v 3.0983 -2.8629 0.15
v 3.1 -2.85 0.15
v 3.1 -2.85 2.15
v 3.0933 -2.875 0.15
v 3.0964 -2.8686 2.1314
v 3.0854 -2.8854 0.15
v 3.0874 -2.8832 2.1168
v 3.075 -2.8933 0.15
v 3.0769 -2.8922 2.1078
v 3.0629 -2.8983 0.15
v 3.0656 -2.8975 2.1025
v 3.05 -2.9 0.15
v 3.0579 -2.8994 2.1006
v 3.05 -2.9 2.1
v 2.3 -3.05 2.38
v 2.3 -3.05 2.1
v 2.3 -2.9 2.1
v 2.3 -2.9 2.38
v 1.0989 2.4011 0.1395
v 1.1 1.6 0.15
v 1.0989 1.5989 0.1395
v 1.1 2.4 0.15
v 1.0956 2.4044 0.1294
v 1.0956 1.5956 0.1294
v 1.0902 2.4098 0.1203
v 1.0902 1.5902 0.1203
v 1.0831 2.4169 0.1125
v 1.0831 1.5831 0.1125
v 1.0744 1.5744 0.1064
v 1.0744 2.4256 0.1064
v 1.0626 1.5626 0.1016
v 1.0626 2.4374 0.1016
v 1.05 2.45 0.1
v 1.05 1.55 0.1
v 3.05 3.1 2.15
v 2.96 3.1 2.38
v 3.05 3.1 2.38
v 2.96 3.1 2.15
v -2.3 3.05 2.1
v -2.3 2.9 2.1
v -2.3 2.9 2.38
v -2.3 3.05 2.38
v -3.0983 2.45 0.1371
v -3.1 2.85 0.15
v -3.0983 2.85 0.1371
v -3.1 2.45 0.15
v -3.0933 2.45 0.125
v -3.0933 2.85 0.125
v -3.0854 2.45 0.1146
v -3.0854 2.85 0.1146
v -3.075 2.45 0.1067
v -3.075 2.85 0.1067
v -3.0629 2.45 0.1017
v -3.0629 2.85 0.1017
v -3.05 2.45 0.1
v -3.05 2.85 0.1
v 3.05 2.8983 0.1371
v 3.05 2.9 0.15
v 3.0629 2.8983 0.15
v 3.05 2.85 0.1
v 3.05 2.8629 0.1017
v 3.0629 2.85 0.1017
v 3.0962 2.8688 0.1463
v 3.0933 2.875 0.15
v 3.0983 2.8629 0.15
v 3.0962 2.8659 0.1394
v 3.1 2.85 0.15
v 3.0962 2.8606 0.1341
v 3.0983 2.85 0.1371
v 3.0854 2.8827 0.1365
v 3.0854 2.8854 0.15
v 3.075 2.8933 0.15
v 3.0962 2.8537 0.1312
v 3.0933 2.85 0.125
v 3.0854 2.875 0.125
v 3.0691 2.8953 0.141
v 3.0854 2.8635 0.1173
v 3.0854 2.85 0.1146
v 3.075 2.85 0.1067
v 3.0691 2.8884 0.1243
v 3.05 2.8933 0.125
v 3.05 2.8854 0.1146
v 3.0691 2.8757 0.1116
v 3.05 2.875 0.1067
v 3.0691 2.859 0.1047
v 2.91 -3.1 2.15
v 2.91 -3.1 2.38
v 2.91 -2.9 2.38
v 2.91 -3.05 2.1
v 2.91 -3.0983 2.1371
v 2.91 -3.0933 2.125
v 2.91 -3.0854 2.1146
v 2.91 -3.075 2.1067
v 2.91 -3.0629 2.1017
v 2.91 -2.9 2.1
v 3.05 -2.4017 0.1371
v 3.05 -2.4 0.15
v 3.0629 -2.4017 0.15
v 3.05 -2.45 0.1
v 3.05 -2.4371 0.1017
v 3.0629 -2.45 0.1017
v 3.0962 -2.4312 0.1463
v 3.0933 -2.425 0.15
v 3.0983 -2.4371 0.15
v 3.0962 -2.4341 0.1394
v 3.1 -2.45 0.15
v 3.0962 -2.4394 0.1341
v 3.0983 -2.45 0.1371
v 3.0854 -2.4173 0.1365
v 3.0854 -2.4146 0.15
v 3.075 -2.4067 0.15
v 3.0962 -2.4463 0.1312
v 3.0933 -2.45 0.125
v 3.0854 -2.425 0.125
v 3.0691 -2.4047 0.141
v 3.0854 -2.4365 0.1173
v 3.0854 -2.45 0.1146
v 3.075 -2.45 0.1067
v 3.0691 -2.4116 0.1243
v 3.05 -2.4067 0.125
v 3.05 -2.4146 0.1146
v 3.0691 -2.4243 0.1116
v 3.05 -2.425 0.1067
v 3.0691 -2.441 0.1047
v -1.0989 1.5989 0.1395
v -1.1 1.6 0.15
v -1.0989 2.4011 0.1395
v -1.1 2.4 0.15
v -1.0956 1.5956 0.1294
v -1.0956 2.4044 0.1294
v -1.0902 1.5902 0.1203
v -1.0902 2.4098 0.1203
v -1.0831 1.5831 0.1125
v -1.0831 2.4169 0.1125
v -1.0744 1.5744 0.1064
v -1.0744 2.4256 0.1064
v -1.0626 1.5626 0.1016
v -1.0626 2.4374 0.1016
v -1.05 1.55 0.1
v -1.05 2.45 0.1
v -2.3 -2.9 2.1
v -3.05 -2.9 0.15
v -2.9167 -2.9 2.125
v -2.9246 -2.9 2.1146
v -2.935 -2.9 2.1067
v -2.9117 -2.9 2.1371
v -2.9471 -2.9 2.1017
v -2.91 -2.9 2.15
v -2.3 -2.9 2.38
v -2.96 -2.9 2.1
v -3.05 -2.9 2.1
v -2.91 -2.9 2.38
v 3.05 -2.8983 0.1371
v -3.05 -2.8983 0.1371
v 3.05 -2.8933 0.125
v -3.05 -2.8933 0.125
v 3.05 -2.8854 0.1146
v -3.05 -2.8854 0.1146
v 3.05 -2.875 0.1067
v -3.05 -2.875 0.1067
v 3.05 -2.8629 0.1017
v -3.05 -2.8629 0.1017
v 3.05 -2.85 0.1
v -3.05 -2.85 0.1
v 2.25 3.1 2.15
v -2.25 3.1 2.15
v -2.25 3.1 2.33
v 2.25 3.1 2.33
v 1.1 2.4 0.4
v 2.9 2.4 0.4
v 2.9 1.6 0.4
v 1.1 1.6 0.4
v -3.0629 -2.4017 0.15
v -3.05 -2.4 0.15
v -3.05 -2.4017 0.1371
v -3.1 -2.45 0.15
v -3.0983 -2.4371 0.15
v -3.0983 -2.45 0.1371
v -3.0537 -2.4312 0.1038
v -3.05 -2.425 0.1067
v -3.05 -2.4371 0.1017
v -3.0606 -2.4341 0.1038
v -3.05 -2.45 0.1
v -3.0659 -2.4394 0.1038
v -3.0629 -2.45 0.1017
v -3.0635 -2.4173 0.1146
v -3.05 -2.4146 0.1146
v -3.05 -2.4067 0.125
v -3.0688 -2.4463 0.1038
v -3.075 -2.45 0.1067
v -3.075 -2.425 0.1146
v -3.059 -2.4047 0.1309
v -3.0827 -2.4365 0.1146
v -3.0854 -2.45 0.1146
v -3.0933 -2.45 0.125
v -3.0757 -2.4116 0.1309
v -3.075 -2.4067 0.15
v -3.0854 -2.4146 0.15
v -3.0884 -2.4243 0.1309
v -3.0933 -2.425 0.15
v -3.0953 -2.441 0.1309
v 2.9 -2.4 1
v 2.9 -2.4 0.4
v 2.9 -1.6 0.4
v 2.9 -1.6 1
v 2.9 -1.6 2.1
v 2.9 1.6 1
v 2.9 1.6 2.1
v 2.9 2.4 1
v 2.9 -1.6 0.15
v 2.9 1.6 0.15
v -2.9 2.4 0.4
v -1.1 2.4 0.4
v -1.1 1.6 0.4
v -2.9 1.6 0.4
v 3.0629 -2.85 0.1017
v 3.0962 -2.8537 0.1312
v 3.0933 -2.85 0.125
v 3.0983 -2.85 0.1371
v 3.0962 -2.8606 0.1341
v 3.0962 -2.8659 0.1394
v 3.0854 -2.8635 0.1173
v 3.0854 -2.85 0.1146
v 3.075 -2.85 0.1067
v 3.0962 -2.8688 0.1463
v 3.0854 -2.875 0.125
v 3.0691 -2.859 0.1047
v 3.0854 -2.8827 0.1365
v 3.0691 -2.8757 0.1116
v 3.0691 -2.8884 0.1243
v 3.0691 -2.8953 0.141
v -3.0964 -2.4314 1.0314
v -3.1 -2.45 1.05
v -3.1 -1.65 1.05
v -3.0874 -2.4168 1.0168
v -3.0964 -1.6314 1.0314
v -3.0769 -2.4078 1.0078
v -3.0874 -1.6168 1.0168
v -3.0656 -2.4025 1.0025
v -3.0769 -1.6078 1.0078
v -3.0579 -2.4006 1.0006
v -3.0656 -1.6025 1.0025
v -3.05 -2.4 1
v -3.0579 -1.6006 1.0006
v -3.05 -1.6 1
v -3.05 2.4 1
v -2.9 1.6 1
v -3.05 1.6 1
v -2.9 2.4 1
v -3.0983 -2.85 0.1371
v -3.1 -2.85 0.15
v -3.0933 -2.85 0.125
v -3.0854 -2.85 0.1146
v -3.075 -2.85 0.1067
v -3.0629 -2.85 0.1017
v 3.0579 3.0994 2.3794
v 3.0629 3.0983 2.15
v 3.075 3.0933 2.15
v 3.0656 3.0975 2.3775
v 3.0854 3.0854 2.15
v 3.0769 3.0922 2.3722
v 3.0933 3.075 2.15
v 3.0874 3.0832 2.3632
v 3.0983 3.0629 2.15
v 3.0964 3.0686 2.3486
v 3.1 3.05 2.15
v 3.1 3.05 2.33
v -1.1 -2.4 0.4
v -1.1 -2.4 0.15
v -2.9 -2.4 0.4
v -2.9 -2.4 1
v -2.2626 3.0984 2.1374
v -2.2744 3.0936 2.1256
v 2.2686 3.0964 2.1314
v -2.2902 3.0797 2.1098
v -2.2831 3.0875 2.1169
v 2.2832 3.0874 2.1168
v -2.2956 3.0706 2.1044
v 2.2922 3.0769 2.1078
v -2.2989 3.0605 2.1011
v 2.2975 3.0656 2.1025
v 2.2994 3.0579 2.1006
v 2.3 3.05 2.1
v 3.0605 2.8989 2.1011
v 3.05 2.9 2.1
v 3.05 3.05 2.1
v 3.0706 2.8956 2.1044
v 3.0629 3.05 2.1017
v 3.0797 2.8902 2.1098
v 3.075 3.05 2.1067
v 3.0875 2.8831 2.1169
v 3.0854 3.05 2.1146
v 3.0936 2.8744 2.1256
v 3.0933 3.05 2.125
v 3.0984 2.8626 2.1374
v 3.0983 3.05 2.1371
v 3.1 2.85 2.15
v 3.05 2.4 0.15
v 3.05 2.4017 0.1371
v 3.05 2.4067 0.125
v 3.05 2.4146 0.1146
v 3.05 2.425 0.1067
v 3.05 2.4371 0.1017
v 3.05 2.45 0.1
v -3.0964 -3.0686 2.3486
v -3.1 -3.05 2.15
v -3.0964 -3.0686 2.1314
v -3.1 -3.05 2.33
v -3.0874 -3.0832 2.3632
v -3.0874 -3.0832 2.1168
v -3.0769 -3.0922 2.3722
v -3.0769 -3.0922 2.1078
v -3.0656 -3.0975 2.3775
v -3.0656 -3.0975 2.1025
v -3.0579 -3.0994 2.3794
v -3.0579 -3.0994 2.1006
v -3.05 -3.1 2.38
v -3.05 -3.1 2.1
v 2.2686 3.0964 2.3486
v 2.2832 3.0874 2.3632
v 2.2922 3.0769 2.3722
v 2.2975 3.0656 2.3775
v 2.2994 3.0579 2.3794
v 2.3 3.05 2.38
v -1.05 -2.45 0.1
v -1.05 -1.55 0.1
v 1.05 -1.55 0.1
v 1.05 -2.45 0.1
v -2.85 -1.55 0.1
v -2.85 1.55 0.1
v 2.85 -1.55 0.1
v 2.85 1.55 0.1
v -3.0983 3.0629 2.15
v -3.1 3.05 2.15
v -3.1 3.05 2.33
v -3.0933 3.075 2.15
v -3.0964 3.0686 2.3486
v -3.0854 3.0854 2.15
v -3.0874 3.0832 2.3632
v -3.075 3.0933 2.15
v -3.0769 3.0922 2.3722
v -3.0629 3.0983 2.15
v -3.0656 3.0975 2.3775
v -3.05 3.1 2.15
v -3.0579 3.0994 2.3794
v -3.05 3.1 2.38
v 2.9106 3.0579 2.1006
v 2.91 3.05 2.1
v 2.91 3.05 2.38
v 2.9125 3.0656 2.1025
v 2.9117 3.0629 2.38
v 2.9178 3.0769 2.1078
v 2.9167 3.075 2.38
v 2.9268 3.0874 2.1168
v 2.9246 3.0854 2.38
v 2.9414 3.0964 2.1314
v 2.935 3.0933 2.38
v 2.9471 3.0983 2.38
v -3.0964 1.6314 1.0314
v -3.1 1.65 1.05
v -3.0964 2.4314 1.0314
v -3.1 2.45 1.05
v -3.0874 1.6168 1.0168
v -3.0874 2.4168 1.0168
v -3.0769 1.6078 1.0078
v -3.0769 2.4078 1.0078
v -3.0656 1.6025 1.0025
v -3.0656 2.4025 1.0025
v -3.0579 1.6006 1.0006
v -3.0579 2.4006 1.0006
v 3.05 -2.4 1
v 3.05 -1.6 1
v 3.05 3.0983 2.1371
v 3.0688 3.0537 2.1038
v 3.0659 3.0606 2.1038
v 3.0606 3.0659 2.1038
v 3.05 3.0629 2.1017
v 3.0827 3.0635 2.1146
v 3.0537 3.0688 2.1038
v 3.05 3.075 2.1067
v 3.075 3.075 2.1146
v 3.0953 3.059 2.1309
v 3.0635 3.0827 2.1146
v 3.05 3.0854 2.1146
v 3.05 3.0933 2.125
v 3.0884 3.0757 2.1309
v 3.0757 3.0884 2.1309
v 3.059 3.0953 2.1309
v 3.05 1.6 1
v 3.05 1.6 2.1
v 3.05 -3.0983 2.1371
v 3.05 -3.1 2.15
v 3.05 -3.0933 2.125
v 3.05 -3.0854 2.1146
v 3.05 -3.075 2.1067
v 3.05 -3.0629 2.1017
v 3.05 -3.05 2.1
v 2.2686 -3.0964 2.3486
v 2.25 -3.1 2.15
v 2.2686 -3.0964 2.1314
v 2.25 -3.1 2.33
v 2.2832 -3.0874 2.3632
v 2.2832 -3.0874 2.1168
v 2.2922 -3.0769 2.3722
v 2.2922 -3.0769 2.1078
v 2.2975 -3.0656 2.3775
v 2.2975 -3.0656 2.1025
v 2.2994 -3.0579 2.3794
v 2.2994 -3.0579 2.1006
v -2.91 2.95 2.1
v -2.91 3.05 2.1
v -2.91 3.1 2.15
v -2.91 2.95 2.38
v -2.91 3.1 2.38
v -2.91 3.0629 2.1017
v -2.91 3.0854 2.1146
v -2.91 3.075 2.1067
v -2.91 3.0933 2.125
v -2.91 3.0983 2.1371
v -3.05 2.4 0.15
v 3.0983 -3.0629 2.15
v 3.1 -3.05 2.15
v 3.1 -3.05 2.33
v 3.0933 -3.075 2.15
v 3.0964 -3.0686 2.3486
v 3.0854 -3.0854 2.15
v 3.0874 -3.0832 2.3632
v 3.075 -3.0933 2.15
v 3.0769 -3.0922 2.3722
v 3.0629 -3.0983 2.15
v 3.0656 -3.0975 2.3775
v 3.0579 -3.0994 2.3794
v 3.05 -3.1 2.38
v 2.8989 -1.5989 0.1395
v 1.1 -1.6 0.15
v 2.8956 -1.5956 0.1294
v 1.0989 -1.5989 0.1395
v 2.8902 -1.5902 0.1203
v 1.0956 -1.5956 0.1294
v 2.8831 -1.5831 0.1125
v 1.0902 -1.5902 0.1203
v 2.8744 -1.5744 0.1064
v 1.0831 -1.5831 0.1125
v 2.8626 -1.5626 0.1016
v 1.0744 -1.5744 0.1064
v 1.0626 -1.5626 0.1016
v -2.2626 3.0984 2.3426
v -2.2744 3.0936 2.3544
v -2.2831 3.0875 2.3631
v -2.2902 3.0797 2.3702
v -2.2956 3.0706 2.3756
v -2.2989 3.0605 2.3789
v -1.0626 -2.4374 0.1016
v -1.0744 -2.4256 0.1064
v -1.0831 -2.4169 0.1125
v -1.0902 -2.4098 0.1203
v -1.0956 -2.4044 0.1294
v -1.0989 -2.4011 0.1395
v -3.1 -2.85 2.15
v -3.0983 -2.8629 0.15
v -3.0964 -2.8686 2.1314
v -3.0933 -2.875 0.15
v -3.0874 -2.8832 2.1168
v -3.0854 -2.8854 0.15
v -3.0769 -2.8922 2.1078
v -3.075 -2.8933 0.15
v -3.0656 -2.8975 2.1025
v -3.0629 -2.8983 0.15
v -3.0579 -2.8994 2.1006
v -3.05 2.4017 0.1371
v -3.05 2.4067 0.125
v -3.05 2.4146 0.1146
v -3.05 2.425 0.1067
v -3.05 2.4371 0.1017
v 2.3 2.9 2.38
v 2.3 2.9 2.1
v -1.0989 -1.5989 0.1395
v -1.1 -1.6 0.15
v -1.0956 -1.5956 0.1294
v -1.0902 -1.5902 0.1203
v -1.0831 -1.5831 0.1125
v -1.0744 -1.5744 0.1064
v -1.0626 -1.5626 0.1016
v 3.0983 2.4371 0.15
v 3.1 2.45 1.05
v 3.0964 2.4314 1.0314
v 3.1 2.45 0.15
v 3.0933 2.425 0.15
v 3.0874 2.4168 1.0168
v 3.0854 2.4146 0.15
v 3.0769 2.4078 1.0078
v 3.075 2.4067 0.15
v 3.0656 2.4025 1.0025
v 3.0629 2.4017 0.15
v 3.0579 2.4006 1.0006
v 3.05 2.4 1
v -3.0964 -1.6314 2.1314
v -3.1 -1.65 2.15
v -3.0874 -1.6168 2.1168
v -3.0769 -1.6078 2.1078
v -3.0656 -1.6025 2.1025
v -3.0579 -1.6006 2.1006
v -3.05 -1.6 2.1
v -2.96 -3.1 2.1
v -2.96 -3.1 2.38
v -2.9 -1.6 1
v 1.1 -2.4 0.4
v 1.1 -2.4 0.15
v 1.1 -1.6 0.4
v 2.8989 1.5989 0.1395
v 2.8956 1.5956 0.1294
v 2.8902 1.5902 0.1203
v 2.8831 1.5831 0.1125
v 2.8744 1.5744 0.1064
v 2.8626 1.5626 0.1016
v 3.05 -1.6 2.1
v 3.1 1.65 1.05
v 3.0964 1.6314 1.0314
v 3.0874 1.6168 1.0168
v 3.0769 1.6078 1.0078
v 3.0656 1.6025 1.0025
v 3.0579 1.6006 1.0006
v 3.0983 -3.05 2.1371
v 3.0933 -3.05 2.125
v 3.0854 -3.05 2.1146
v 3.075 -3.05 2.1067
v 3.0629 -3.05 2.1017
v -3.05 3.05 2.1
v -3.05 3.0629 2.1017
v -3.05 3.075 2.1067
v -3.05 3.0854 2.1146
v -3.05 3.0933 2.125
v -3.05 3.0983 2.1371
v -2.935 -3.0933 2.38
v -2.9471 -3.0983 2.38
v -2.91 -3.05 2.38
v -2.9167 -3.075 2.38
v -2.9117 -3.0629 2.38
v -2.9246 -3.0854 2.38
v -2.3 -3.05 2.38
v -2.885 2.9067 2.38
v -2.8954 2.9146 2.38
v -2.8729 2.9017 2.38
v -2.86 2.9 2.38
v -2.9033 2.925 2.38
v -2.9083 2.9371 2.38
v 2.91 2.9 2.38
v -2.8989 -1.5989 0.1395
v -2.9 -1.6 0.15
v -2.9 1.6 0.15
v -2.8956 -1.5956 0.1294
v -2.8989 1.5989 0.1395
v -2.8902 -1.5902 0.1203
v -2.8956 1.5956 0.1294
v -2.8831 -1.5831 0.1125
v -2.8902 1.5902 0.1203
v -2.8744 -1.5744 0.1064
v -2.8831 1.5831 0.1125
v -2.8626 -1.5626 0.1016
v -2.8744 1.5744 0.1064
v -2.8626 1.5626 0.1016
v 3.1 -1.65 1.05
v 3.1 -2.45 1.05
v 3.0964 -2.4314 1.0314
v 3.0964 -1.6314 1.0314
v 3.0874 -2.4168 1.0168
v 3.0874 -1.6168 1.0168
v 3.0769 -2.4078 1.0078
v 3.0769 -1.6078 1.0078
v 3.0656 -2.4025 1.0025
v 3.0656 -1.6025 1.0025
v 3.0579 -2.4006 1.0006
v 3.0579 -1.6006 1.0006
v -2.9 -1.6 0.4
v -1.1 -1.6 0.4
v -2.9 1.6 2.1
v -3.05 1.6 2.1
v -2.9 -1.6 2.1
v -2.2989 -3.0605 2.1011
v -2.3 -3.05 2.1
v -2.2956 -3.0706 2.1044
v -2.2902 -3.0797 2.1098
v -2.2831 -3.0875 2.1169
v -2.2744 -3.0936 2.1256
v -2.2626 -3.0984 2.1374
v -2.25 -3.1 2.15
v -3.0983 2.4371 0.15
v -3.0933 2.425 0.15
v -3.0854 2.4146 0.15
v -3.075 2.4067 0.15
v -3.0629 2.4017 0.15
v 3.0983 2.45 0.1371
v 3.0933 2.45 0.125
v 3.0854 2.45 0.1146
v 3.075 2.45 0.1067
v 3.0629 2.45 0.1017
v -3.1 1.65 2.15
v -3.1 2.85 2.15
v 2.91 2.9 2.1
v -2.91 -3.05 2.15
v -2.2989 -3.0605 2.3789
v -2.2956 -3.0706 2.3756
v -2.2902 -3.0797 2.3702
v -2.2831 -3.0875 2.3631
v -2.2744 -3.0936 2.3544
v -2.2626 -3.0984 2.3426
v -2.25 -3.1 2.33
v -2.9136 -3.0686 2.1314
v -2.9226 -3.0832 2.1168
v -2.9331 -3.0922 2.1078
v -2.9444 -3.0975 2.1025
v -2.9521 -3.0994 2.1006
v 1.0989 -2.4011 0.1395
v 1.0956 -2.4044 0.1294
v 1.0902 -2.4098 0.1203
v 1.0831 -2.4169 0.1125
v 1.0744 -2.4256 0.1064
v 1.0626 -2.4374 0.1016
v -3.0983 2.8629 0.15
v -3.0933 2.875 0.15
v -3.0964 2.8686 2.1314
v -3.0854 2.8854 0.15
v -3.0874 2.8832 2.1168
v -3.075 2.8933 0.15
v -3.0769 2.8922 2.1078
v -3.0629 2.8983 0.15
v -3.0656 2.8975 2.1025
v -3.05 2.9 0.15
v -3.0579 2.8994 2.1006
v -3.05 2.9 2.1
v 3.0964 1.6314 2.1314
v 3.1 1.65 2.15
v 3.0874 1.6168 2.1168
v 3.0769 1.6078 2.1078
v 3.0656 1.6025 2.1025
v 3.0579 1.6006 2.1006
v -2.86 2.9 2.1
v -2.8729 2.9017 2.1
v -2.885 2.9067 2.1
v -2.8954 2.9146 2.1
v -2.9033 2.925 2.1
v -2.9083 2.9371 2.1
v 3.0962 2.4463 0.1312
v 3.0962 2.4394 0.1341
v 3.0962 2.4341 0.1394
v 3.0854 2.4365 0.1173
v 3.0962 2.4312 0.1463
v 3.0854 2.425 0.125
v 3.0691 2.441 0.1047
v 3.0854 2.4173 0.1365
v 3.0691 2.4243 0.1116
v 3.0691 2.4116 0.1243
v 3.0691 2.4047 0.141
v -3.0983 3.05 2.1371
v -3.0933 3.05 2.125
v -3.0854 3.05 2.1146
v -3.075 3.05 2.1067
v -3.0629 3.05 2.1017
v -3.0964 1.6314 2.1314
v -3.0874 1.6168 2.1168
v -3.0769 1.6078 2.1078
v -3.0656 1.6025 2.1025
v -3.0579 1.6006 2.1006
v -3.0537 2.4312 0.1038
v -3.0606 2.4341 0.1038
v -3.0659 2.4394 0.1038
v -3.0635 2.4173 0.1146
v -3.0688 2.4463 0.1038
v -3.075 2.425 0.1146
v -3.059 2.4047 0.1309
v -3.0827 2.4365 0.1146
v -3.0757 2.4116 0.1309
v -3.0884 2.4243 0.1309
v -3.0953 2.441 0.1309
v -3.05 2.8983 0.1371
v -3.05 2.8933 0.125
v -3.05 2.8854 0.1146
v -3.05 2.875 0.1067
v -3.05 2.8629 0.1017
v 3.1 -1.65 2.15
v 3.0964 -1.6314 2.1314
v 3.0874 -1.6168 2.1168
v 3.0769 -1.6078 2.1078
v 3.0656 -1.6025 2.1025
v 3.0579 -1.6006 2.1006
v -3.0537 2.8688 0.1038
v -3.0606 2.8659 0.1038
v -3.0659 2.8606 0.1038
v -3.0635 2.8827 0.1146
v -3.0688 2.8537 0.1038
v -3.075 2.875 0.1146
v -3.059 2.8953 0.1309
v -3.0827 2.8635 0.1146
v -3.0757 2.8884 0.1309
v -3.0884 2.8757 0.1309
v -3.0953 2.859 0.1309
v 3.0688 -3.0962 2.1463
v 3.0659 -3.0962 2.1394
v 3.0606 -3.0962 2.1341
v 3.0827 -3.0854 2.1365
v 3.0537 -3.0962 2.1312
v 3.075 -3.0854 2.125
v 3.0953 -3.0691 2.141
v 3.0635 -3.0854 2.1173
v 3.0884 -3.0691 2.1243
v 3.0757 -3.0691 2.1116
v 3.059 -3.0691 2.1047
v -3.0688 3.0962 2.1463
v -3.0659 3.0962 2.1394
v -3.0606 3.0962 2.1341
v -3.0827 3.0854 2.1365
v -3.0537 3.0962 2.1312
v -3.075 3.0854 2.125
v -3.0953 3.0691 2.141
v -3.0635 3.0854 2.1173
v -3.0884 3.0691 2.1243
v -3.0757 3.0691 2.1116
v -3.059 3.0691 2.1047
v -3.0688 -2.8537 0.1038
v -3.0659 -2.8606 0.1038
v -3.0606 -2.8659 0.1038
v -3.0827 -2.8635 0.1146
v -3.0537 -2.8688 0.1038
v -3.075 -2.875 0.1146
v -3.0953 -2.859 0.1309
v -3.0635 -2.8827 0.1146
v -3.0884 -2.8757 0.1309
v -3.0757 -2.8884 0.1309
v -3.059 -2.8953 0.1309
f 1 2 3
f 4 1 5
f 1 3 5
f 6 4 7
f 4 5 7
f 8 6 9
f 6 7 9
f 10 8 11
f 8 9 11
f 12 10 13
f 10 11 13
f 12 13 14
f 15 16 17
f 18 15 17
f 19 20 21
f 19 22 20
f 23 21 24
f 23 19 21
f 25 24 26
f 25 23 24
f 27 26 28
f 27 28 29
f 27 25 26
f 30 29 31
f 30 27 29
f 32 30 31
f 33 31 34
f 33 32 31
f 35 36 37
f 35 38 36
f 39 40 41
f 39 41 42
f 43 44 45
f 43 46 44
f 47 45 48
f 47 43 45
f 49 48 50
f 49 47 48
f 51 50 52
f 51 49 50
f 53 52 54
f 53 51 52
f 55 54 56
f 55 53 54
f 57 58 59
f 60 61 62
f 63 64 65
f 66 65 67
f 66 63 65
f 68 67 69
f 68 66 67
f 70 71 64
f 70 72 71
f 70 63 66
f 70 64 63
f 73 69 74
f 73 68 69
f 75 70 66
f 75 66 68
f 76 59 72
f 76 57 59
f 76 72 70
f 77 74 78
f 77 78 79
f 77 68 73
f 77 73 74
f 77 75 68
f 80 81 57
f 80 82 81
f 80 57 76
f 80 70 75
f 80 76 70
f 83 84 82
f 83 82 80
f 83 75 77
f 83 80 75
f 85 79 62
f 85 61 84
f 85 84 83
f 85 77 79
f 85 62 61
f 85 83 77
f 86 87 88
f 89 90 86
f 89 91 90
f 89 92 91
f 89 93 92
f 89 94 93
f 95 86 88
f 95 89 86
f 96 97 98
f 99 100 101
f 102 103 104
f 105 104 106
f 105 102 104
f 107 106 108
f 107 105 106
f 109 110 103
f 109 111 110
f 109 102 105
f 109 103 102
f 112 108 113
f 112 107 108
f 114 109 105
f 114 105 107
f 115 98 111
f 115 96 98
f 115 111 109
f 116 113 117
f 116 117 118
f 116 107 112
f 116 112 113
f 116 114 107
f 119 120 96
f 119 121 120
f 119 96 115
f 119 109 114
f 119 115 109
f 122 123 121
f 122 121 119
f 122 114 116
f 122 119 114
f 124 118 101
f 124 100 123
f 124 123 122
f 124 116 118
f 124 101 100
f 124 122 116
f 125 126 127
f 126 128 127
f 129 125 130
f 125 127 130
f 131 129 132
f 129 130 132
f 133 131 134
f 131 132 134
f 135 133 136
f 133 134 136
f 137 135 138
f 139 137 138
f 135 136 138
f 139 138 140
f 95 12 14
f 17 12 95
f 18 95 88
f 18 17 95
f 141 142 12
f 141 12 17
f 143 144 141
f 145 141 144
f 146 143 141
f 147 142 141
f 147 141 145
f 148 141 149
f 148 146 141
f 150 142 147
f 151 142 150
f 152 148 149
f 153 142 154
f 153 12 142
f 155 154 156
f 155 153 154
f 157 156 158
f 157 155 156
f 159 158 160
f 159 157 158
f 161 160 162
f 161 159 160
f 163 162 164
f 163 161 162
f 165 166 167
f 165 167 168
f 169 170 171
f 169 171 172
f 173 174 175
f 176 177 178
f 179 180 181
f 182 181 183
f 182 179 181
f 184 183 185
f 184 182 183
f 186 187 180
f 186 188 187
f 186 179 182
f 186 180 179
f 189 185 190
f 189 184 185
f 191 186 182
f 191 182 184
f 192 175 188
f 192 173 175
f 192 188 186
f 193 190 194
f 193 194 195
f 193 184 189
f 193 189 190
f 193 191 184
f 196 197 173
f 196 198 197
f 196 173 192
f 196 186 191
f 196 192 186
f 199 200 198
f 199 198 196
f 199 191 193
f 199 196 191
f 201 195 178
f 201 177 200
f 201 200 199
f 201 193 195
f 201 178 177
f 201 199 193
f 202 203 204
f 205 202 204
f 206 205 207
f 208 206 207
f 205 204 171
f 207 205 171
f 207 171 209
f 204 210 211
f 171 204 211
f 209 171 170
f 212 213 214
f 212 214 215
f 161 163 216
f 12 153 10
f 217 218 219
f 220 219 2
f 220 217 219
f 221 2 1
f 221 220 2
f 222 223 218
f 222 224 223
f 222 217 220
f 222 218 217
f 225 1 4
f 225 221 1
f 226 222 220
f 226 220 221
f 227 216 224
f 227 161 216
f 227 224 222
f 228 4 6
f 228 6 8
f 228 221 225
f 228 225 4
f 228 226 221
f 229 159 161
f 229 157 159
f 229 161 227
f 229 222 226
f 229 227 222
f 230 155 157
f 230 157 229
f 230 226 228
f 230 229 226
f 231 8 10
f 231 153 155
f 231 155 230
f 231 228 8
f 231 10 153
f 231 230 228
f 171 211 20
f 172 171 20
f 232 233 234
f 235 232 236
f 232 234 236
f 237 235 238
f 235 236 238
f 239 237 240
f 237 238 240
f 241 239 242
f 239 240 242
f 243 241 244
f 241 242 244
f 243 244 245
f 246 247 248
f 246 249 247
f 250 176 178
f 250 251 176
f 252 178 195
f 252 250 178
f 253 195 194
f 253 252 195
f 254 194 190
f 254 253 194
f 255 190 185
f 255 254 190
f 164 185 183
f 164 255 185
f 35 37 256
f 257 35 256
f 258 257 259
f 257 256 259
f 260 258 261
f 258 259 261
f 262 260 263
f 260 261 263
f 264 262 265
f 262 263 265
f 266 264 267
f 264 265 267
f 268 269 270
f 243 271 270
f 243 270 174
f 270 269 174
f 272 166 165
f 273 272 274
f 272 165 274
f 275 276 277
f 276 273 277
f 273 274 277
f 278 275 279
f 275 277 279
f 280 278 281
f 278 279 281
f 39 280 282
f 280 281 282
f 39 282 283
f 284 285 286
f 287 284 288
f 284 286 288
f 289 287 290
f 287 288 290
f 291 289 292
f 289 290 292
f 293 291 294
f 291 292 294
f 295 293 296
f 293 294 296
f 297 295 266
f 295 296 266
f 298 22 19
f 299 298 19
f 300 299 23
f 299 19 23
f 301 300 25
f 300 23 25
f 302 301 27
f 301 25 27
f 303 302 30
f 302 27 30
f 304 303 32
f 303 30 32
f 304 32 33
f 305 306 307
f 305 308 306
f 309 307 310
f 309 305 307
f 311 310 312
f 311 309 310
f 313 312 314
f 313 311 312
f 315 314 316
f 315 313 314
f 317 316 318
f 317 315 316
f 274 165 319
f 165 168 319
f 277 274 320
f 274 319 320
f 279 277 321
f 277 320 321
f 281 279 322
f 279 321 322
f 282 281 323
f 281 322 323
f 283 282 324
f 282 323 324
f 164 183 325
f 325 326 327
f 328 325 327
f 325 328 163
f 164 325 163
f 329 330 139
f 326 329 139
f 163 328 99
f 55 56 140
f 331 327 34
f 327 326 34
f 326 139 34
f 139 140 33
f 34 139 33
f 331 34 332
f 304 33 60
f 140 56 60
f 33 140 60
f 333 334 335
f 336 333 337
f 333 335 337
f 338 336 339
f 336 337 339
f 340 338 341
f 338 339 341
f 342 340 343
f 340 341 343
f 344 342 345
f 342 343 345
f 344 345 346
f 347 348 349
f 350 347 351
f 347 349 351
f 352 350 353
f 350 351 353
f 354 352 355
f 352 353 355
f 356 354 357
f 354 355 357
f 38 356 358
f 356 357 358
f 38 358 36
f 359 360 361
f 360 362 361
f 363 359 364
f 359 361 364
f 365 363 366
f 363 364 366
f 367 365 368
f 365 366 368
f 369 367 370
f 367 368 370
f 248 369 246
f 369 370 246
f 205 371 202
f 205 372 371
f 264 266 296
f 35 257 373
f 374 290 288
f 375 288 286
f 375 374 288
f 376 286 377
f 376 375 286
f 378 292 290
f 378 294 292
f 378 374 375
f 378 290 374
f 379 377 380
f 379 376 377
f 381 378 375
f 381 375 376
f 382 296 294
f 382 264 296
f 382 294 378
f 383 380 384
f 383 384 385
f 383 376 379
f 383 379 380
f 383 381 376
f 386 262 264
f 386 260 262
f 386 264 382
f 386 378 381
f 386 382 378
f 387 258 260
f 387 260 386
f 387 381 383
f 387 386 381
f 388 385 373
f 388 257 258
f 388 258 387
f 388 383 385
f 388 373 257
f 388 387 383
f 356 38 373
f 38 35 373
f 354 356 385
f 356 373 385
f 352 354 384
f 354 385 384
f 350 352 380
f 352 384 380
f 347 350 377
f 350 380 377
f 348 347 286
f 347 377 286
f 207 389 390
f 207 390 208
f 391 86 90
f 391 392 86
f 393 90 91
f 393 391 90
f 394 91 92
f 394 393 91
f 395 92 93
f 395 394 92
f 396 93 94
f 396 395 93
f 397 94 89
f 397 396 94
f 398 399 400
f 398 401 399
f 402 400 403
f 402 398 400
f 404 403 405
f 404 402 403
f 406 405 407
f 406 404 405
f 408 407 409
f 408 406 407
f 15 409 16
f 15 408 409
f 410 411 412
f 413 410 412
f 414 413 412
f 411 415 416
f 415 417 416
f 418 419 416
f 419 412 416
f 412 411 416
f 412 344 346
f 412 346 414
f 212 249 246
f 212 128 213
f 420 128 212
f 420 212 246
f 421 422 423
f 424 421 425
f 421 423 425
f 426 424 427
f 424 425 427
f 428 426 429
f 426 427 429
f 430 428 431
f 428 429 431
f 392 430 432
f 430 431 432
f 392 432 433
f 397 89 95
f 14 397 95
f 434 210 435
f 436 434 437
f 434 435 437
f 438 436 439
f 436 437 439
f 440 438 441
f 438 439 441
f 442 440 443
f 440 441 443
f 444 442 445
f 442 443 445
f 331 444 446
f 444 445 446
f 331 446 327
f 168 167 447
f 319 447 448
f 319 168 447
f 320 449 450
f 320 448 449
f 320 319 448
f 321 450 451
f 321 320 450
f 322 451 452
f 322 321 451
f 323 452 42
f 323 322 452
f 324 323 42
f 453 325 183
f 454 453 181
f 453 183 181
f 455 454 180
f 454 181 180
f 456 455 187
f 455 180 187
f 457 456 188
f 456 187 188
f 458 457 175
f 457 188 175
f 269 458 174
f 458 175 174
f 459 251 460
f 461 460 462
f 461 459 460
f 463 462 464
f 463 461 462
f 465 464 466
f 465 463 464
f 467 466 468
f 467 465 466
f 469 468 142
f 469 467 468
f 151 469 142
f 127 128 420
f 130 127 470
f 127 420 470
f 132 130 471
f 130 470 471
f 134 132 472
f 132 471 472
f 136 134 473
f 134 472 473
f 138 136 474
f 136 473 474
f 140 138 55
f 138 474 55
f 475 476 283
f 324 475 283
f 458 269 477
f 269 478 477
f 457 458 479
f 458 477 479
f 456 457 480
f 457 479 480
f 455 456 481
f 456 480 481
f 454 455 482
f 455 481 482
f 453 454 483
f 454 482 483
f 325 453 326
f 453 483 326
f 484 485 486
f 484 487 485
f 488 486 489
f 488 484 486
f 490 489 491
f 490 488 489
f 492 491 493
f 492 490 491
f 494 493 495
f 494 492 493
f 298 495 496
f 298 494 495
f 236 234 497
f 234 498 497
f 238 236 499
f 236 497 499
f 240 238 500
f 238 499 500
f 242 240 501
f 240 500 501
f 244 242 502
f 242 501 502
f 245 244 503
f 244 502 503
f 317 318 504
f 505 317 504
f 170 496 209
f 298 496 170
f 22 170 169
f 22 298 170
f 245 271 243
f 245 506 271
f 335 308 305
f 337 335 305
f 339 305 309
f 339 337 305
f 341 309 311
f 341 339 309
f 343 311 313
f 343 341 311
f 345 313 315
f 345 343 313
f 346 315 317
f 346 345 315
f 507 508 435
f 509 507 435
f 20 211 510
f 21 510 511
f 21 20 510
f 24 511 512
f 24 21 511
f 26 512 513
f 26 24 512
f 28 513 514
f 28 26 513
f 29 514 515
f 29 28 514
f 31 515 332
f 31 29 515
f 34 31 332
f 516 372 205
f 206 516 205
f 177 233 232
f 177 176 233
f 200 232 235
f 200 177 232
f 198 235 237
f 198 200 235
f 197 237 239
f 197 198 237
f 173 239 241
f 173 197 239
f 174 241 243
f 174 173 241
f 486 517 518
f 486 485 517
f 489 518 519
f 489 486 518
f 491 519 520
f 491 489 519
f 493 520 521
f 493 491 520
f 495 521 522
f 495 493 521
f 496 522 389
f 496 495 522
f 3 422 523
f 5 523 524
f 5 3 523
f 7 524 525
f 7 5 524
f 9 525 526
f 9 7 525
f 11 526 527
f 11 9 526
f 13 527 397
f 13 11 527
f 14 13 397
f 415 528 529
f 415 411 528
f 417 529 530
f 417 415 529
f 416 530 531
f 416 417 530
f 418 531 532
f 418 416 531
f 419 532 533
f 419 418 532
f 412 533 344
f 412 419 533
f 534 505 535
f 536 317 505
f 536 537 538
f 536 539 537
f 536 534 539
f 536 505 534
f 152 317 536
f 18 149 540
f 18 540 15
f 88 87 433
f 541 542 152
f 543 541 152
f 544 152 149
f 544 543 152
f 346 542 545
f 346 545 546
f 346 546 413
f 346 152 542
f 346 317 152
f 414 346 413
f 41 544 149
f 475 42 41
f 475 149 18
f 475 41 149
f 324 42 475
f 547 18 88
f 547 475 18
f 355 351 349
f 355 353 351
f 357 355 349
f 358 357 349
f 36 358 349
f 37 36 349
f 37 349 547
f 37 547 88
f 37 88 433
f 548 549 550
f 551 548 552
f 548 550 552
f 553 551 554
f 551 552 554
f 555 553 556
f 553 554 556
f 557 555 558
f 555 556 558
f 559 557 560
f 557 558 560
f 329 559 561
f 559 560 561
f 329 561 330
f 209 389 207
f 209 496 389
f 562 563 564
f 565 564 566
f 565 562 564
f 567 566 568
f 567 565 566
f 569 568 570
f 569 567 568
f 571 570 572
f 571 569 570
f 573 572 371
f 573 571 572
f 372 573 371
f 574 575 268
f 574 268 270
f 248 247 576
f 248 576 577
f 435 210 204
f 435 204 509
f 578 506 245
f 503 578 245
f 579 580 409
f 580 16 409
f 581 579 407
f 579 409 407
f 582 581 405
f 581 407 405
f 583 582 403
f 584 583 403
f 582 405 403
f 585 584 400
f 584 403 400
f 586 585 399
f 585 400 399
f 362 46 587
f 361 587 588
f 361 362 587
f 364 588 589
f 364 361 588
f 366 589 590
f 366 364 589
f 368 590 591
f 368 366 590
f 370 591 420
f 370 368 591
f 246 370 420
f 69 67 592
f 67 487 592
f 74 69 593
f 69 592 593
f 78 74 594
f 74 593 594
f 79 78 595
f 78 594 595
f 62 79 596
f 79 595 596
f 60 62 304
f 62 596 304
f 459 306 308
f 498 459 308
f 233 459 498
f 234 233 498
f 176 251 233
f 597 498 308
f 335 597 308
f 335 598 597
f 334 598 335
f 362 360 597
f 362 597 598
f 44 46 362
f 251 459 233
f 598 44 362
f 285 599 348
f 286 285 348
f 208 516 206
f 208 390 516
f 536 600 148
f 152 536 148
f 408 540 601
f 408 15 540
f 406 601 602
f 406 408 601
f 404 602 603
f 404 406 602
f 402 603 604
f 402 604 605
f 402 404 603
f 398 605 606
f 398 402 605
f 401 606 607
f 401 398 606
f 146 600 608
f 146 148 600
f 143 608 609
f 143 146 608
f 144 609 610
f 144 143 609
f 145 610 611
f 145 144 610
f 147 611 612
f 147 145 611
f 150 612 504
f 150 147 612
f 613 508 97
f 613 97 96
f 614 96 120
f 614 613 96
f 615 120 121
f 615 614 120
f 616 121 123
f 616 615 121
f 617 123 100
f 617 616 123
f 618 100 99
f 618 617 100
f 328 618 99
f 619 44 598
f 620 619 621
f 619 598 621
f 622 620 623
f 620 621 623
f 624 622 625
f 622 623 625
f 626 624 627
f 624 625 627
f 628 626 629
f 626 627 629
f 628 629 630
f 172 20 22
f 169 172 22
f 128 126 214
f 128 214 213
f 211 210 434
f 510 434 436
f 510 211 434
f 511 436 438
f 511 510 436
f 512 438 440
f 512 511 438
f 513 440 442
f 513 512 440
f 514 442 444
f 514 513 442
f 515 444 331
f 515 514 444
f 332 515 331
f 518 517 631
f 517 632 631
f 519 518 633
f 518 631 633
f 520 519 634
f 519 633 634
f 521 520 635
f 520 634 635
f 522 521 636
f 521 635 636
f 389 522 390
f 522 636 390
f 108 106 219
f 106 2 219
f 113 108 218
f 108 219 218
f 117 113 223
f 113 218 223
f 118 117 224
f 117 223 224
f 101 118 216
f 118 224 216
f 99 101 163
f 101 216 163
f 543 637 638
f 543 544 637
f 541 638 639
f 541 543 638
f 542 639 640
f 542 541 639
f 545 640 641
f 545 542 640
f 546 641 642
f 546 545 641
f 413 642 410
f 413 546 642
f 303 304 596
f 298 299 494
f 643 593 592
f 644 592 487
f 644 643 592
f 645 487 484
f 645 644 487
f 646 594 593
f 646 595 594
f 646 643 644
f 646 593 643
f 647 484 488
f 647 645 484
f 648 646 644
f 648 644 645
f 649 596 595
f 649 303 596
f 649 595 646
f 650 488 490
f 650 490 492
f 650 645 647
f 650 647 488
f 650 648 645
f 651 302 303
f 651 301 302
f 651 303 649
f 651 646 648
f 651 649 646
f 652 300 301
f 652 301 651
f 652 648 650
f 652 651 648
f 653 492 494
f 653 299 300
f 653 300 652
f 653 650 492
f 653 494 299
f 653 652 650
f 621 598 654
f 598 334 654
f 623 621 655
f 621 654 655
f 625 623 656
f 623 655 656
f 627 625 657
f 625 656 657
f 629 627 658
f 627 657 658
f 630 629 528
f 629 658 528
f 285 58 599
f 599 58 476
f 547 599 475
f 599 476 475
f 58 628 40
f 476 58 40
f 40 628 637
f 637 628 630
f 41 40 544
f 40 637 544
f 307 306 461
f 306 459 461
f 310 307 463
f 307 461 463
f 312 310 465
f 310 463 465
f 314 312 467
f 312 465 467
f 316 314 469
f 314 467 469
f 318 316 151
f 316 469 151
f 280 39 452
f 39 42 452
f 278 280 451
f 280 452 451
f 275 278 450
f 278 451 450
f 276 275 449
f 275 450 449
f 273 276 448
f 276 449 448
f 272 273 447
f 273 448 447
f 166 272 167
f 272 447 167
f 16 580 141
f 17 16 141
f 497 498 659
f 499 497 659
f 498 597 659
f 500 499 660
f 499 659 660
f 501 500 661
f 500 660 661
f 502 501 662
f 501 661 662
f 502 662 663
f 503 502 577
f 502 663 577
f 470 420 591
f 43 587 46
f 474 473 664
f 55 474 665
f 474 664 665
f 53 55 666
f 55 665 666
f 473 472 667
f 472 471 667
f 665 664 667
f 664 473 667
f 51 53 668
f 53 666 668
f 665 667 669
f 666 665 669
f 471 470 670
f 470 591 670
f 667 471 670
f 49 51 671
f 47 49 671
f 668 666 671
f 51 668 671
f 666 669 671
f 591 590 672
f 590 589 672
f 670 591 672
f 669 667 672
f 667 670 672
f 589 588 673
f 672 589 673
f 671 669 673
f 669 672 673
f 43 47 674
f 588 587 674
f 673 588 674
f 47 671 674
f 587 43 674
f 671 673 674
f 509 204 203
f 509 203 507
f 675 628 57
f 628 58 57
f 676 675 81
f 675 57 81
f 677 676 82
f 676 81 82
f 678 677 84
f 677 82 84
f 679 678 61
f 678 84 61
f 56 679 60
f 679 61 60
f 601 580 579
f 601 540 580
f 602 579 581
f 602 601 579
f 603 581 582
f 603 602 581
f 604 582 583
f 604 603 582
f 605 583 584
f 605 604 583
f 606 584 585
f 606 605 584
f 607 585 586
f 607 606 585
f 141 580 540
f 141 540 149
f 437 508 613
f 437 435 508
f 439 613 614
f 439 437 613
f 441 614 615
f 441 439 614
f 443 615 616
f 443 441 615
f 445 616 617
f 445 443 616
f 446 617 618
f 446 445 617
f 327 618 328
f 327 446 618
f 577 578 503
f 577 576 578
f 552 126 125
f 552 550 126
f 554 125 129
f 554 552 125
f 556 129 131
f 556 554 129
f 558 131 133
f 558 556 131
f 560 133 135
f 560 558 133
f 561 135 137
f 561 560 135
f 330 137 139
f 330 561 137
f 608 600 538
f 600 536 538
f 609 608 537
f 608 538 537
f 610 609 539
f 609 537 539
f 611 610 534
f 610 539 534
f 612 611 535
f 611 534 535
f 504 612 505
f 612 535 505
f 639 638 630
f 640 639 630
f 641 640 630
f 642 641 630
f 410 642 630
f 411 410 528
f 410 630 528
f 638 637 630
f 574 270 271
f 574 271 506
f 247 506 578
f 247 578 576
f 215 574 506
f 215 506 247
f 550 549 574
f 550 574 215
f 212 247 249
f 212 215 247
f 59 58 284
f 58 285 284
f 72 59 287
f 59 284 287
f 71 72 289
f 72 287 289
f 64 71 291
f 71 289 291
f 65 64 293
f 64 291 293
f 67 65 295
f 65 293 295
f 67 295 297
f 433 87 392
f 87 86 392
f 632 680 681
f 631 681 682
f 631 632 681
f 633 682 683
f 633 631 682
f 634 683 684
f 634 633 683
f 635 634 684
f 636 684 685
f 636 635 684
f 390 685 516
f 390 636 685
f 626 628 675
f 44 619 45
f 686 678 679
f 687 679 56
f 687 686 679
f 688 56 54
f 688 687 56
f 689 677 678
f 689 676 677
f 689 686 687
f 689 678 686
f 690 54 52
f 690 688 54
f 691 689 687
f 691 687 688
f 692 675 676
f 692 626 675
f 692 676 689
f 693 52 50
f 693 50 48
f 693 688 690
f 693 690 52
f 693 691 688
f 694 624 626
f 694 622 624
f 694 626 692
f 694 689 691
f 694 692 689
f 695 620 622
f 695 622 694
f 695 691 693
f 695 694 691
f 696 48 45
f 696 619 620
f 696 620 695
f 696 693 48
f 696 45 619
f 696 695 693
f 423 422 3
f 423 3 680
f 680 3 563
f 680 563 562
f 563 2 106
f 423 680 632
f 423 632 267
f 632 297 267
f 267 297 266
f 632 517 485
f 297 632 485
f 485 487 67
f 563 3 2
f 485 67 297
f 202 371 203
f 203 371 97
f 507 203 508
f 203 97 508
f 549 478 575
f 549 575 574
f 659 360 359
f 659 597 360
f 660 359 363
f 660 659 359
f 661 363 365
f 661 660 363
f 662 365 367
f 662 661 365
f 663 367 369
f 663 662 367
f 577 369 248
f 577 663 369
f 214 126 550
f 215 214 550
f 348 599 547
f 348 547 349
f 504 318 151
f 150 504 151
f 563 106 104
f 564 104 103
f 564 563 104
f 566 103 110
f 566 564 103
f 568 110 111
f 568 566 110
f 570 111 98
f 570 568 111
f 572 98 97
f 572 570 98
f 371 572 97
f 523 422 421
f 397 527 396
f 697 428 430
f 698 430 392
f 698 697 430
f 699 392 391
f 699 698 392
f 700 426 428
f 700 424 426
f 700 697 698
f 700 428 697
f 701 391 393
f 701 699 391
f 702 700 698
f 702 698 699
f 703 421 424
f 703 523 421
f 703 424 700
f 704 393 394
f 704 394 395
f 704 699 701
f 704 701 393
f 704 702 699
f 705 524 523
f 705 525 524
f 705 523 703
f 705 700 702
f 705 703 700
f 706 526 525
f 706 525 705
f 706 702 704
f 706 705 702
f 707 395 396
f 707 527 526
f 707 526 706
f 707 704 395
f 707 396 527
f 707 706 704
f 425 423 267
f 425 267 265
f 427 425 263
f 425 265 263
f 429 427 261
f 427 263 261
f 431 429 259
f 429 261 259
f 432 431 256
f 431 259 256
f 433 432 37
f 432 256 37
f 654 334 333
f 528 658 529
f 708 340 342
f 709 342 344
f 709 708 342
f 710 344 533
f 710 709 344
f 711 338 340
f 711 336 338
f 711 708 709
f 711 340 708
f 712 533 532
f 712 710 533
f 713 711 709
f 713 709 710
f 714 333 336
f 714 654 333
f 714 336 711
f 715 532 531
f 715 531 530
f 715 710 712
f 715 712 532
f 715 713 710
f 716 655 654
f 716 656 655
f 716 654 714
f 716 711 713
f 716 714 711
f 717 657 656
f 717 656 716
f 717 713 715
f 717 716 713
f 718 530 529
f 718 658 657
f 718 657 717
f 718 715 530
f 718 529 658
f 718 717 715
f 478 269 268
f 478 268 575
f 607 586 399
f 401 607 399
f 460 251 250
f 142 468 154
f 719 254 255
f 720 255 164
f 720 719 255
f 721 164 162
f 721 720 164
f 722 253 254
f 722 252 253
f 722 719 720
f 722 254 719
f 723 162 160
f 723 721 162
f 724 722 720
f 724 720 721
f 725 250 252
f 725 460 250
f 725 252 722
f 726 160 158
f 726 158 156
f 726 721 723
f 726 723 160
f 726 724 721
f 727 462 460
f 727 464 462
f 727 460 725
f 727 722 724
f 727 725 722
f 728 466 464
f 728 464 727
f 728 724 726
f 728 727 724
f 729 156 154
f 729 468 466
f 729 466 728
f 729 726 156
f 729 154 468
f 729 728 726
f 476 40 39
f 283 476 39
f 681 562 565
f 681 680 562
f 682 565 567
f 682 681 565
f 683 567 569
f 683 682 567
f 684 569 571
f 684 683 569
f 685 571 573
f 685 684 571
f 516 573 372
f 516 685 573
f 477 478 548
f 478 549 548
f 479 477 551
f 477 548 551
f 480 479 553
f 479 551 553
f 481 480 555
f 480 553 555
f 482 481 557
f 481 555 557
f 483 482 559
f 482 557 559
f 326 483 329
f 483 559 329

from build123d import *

# Parameters (mm, degrees)
SKETCH1_W           = 6.2
SKETCH1_H           = 6.2
BOSS_EXTRUDE1_DEPTH = 2.38
SKETCH2_W           = 2
SKETCH2_H           = 0.8
CUT_EXTRUDE1_DEPTH  = 0.4
SKETCH3_W           = 6.2
SKETCH3_H           = 0.1
CUT_EXTRUDE2_DEPTH  = 7.2
SKETCH14_W          = 0.2
SKETCH14_H          = 3.2
CUT_EXTRUDE3_DEPTH  = 2
SKETCH16_W          = 2
SKETCH16_H          = 0.2
CUT_EXTRUDE4_DEPTH  = 7.2
SKETCH19_W          = 0.61
SKETCH19_H          = 0.2
CUT_EXTRUDE5_DEPTH  = 1.28
SKETCH20_W          = 0.2
SKETCH20_H          = 0.8
CUT_EXTRUDE6_DEPTH  = 0.6
FILLET1_R           = 0.05


with BuildPart() as part:
    # Sketch1 → Boss-Extrude1 (new body)
    with BuildSketch(Plane.XY):
        Rectangle(SKETCH1_W, SKETCH1_H)
    extrude(amount=BOSS_EXTRUDE1_DEPTH)

    # Sketch2 → Cut-Extrude1 (cut)
    with BuildSketch(Plane(origin=(0, 0, 0), x_dir=(-1, 0, 0), z_dir=(0, 0, -1))):
        with Locations((-2.1, 2)):
            Rectangle(SKETCH2_W, SKETCH2_H)
        with Locations((2.1, 2)):
            Rectangle(SKETCH2_W, SKETCH2_H)
        with Locations((2.1, -2)):
            Rectangle(SKETCH2_W, SKETCH2_H)
        with Locations((-2.1, -2)):
            Rectangle(SKETCH2_W, SKETCH2_H)
    extrude(amount=-CUT_EXTRUDE1_DEPTH, mode=Mode.SUBTRACT)

    # Sketch3 → Cut-Extrude2 (cut, through all)
    with BuildSketch(Plane(origin=(0, 3.1, 0), x_dir=(1, 0, 0), z_dir=(0, 1, 0))):
        with Locations((0, -0.05)):
            Rectangle(SKETCH3_W, SKETCH3_H)
    extrude(amount=-CUT_EXTRUDE2_DEPTH, mode=Mode.SUBTRACT)

    # Sketch14 → Cut-Extrude3 (cut)
    with BuildSketch(Plane(origin=(0, 0, 0.1), x_dir=(-1, 0, 0), z_dir=(0, 0, -1))):
        with Locations((3, 0)):
            Rectangle(SKETCH14_W, SKETCH14_H)
        with Locations((-3, 0)):
            Rectangle(SKETCH14_W, SKETCH14_H)
    extrude(amount=-CUT_EXTRUDE3_DEPTH, mode=Mode.SUBTRACT)

    # Sketch16 → Cut-Extrude4 (cut, through all)
    with BuildSketch(Plane.ZY.offset(3.1)):
        with Locations((1.1, -3)):
            Rectangle(SKETCH16_W, SKETCH16_H)
        with Locations((1.1, 3)):
            Rectangle(SKETCH16_W, SKETCH16_H)
    extrude(amount=-CUT_EXTRUDE4_DEPTH, mode=Mode.SUBTRACT)

    # Sketch19 → Cut-Extrude5 (cut, through all)
    with BuildSketch(Plane(origin=(0, 0, 2.1), x_dir=(-1, 0, 0), z_dir=(0, 0, -1))):
        with Locations((-2.605, -3)):
            Rectangle(SKETCH19_W, SKETCH19_H)
        with Locations((2.605, -3)):
            Rectangle(SKETCH19_W, SKETCH19_H)
        with Locations((2.605, 3)):
            Rectangle(SKETCH19_W, SKETCH19_H)
        with Locations((-2.605, 3)):
            Rectangle(SKETCH19_W, SKETCH19_H)
    extrude(amount=-CUT_EXTRUDE5_DEPTH, mode=Mode.SUBTRACT)

    # Sketch20 → Cut-Extrude6 (cut)
    with BuildSketch(Plane(origin=(0, 0, 0.4), x_dir=(-1, 0, 0), z_dir=(0, 0, -1))):
        with Locations((-3, -2)):
            Rectangle(SKETCH20_W, SKETCH20_H)
        with Locations((-3, 2)):
            Rectangle(SKETCH20_W, SKETCH20_H)
        with Locations((3, 2)):
            Rectangle(SKETCH20_W, SKETCH20_H)
        with Locations((3, -2)):
            Rectangle(SKETCH20_W, SKETCH20_H)
    extrude(amount=-CUT_EXTRUDE6_DEPTH, mode=Mode.SUBTRACT)

    # Fillet1
    fillet1_edges = [part.edges().sort_by_distance(p)[0] for p in [
        (2.3, -3.1, 2.24),
        (0, -3.1, 2.1),
        (-2.3, -3.1, 2.24),
        (0, -3.1, 2.38),
        (-2.3, 3.1, 2.24),
        (0, 3.1, 2.1),
        (2.3, 3.1, 2.24),
        (0, 3.1, 2.38),
        (-3.1, -1.6, 1.55),
        (-3.1, 0, 2.1),
        (-3.1, 1.6, 1.55),
        (-3.1, 2, 1),
        (-3.1, 2.4, 0.55),
        (-3.1, 2.9, 1.1),
        (-3.1, 3, 2.1),
        (-3.1, 3.1, 2.24),
        (-3.1, 0, 2.38),
        (-3.1, -3.1, 2.24),
        (-3.1, -3, 2.1),
        (-3.1, -2.9, 1.1),
        (-3.1, -2.4, 0.55),
        (-3.1, -2, 1),
        (-2.1, 2.4, 0.1),
        (-1.1, 2, 0.1),
        (-2, 1.6, 0.1),
        (-2.9, 0, 0.1),
        (-2, -1.6, 0.1),
        (-1.1, -2, 0.1),
        (-2.1, -2.4, 0.1),
        (-3.1, -2.65, 0.1),
        (0, -2.9, 0.1),
        (2.1, -2.4, 0.1),
        (1.1, -2, 0.1),
        (2, -1.6, 0.1),
        (2.9, 0, 0.1),
        (2, 1.6, 0.1),
        (1.1, 2, 0.1),
        (2.1, 2.4, 0.1),
        (0, 2.9, 0.1),
        (-3.1, 2.65, 0.1),
        (3.1, 1.6, 1.55),
        (3.1, 0, 2.1),
        (3.1, -1.6, 1.55),
        (3.1, -2, 1),
        (3.1, -2.4, 0.55),
        (3.1, -2.65, 0.1),
        (3.1, -2.9, 1.1),
        (3.1, -3, 2.1),
        (3.1, -3.1, 2.24),
        (3.1, 0, 2.38),
        (3.1, 3.1, 2.24),
        (3.1, 3, 2.1),
        (3.1, 2.9, 1.1),
        (3.1, 2.65, 0.1),
        (3.1, 2.4, 0.55),
        (3.1, 2, 1),
        (3.005, -3.1, 2.1),
        (-2.91, -3.1, 2.24),
        (-2.91, -3, 2.1),
        (3.005, 3.1, 2.1),
        (2.91, 3.1, 2.24),
        (-3.005, 3.1, 2.1),
        (-2.91, 2.9, 2.24),
    ]]
    fillet(fillet1_edges, radius=FILLET1_R)


solid = part.part
